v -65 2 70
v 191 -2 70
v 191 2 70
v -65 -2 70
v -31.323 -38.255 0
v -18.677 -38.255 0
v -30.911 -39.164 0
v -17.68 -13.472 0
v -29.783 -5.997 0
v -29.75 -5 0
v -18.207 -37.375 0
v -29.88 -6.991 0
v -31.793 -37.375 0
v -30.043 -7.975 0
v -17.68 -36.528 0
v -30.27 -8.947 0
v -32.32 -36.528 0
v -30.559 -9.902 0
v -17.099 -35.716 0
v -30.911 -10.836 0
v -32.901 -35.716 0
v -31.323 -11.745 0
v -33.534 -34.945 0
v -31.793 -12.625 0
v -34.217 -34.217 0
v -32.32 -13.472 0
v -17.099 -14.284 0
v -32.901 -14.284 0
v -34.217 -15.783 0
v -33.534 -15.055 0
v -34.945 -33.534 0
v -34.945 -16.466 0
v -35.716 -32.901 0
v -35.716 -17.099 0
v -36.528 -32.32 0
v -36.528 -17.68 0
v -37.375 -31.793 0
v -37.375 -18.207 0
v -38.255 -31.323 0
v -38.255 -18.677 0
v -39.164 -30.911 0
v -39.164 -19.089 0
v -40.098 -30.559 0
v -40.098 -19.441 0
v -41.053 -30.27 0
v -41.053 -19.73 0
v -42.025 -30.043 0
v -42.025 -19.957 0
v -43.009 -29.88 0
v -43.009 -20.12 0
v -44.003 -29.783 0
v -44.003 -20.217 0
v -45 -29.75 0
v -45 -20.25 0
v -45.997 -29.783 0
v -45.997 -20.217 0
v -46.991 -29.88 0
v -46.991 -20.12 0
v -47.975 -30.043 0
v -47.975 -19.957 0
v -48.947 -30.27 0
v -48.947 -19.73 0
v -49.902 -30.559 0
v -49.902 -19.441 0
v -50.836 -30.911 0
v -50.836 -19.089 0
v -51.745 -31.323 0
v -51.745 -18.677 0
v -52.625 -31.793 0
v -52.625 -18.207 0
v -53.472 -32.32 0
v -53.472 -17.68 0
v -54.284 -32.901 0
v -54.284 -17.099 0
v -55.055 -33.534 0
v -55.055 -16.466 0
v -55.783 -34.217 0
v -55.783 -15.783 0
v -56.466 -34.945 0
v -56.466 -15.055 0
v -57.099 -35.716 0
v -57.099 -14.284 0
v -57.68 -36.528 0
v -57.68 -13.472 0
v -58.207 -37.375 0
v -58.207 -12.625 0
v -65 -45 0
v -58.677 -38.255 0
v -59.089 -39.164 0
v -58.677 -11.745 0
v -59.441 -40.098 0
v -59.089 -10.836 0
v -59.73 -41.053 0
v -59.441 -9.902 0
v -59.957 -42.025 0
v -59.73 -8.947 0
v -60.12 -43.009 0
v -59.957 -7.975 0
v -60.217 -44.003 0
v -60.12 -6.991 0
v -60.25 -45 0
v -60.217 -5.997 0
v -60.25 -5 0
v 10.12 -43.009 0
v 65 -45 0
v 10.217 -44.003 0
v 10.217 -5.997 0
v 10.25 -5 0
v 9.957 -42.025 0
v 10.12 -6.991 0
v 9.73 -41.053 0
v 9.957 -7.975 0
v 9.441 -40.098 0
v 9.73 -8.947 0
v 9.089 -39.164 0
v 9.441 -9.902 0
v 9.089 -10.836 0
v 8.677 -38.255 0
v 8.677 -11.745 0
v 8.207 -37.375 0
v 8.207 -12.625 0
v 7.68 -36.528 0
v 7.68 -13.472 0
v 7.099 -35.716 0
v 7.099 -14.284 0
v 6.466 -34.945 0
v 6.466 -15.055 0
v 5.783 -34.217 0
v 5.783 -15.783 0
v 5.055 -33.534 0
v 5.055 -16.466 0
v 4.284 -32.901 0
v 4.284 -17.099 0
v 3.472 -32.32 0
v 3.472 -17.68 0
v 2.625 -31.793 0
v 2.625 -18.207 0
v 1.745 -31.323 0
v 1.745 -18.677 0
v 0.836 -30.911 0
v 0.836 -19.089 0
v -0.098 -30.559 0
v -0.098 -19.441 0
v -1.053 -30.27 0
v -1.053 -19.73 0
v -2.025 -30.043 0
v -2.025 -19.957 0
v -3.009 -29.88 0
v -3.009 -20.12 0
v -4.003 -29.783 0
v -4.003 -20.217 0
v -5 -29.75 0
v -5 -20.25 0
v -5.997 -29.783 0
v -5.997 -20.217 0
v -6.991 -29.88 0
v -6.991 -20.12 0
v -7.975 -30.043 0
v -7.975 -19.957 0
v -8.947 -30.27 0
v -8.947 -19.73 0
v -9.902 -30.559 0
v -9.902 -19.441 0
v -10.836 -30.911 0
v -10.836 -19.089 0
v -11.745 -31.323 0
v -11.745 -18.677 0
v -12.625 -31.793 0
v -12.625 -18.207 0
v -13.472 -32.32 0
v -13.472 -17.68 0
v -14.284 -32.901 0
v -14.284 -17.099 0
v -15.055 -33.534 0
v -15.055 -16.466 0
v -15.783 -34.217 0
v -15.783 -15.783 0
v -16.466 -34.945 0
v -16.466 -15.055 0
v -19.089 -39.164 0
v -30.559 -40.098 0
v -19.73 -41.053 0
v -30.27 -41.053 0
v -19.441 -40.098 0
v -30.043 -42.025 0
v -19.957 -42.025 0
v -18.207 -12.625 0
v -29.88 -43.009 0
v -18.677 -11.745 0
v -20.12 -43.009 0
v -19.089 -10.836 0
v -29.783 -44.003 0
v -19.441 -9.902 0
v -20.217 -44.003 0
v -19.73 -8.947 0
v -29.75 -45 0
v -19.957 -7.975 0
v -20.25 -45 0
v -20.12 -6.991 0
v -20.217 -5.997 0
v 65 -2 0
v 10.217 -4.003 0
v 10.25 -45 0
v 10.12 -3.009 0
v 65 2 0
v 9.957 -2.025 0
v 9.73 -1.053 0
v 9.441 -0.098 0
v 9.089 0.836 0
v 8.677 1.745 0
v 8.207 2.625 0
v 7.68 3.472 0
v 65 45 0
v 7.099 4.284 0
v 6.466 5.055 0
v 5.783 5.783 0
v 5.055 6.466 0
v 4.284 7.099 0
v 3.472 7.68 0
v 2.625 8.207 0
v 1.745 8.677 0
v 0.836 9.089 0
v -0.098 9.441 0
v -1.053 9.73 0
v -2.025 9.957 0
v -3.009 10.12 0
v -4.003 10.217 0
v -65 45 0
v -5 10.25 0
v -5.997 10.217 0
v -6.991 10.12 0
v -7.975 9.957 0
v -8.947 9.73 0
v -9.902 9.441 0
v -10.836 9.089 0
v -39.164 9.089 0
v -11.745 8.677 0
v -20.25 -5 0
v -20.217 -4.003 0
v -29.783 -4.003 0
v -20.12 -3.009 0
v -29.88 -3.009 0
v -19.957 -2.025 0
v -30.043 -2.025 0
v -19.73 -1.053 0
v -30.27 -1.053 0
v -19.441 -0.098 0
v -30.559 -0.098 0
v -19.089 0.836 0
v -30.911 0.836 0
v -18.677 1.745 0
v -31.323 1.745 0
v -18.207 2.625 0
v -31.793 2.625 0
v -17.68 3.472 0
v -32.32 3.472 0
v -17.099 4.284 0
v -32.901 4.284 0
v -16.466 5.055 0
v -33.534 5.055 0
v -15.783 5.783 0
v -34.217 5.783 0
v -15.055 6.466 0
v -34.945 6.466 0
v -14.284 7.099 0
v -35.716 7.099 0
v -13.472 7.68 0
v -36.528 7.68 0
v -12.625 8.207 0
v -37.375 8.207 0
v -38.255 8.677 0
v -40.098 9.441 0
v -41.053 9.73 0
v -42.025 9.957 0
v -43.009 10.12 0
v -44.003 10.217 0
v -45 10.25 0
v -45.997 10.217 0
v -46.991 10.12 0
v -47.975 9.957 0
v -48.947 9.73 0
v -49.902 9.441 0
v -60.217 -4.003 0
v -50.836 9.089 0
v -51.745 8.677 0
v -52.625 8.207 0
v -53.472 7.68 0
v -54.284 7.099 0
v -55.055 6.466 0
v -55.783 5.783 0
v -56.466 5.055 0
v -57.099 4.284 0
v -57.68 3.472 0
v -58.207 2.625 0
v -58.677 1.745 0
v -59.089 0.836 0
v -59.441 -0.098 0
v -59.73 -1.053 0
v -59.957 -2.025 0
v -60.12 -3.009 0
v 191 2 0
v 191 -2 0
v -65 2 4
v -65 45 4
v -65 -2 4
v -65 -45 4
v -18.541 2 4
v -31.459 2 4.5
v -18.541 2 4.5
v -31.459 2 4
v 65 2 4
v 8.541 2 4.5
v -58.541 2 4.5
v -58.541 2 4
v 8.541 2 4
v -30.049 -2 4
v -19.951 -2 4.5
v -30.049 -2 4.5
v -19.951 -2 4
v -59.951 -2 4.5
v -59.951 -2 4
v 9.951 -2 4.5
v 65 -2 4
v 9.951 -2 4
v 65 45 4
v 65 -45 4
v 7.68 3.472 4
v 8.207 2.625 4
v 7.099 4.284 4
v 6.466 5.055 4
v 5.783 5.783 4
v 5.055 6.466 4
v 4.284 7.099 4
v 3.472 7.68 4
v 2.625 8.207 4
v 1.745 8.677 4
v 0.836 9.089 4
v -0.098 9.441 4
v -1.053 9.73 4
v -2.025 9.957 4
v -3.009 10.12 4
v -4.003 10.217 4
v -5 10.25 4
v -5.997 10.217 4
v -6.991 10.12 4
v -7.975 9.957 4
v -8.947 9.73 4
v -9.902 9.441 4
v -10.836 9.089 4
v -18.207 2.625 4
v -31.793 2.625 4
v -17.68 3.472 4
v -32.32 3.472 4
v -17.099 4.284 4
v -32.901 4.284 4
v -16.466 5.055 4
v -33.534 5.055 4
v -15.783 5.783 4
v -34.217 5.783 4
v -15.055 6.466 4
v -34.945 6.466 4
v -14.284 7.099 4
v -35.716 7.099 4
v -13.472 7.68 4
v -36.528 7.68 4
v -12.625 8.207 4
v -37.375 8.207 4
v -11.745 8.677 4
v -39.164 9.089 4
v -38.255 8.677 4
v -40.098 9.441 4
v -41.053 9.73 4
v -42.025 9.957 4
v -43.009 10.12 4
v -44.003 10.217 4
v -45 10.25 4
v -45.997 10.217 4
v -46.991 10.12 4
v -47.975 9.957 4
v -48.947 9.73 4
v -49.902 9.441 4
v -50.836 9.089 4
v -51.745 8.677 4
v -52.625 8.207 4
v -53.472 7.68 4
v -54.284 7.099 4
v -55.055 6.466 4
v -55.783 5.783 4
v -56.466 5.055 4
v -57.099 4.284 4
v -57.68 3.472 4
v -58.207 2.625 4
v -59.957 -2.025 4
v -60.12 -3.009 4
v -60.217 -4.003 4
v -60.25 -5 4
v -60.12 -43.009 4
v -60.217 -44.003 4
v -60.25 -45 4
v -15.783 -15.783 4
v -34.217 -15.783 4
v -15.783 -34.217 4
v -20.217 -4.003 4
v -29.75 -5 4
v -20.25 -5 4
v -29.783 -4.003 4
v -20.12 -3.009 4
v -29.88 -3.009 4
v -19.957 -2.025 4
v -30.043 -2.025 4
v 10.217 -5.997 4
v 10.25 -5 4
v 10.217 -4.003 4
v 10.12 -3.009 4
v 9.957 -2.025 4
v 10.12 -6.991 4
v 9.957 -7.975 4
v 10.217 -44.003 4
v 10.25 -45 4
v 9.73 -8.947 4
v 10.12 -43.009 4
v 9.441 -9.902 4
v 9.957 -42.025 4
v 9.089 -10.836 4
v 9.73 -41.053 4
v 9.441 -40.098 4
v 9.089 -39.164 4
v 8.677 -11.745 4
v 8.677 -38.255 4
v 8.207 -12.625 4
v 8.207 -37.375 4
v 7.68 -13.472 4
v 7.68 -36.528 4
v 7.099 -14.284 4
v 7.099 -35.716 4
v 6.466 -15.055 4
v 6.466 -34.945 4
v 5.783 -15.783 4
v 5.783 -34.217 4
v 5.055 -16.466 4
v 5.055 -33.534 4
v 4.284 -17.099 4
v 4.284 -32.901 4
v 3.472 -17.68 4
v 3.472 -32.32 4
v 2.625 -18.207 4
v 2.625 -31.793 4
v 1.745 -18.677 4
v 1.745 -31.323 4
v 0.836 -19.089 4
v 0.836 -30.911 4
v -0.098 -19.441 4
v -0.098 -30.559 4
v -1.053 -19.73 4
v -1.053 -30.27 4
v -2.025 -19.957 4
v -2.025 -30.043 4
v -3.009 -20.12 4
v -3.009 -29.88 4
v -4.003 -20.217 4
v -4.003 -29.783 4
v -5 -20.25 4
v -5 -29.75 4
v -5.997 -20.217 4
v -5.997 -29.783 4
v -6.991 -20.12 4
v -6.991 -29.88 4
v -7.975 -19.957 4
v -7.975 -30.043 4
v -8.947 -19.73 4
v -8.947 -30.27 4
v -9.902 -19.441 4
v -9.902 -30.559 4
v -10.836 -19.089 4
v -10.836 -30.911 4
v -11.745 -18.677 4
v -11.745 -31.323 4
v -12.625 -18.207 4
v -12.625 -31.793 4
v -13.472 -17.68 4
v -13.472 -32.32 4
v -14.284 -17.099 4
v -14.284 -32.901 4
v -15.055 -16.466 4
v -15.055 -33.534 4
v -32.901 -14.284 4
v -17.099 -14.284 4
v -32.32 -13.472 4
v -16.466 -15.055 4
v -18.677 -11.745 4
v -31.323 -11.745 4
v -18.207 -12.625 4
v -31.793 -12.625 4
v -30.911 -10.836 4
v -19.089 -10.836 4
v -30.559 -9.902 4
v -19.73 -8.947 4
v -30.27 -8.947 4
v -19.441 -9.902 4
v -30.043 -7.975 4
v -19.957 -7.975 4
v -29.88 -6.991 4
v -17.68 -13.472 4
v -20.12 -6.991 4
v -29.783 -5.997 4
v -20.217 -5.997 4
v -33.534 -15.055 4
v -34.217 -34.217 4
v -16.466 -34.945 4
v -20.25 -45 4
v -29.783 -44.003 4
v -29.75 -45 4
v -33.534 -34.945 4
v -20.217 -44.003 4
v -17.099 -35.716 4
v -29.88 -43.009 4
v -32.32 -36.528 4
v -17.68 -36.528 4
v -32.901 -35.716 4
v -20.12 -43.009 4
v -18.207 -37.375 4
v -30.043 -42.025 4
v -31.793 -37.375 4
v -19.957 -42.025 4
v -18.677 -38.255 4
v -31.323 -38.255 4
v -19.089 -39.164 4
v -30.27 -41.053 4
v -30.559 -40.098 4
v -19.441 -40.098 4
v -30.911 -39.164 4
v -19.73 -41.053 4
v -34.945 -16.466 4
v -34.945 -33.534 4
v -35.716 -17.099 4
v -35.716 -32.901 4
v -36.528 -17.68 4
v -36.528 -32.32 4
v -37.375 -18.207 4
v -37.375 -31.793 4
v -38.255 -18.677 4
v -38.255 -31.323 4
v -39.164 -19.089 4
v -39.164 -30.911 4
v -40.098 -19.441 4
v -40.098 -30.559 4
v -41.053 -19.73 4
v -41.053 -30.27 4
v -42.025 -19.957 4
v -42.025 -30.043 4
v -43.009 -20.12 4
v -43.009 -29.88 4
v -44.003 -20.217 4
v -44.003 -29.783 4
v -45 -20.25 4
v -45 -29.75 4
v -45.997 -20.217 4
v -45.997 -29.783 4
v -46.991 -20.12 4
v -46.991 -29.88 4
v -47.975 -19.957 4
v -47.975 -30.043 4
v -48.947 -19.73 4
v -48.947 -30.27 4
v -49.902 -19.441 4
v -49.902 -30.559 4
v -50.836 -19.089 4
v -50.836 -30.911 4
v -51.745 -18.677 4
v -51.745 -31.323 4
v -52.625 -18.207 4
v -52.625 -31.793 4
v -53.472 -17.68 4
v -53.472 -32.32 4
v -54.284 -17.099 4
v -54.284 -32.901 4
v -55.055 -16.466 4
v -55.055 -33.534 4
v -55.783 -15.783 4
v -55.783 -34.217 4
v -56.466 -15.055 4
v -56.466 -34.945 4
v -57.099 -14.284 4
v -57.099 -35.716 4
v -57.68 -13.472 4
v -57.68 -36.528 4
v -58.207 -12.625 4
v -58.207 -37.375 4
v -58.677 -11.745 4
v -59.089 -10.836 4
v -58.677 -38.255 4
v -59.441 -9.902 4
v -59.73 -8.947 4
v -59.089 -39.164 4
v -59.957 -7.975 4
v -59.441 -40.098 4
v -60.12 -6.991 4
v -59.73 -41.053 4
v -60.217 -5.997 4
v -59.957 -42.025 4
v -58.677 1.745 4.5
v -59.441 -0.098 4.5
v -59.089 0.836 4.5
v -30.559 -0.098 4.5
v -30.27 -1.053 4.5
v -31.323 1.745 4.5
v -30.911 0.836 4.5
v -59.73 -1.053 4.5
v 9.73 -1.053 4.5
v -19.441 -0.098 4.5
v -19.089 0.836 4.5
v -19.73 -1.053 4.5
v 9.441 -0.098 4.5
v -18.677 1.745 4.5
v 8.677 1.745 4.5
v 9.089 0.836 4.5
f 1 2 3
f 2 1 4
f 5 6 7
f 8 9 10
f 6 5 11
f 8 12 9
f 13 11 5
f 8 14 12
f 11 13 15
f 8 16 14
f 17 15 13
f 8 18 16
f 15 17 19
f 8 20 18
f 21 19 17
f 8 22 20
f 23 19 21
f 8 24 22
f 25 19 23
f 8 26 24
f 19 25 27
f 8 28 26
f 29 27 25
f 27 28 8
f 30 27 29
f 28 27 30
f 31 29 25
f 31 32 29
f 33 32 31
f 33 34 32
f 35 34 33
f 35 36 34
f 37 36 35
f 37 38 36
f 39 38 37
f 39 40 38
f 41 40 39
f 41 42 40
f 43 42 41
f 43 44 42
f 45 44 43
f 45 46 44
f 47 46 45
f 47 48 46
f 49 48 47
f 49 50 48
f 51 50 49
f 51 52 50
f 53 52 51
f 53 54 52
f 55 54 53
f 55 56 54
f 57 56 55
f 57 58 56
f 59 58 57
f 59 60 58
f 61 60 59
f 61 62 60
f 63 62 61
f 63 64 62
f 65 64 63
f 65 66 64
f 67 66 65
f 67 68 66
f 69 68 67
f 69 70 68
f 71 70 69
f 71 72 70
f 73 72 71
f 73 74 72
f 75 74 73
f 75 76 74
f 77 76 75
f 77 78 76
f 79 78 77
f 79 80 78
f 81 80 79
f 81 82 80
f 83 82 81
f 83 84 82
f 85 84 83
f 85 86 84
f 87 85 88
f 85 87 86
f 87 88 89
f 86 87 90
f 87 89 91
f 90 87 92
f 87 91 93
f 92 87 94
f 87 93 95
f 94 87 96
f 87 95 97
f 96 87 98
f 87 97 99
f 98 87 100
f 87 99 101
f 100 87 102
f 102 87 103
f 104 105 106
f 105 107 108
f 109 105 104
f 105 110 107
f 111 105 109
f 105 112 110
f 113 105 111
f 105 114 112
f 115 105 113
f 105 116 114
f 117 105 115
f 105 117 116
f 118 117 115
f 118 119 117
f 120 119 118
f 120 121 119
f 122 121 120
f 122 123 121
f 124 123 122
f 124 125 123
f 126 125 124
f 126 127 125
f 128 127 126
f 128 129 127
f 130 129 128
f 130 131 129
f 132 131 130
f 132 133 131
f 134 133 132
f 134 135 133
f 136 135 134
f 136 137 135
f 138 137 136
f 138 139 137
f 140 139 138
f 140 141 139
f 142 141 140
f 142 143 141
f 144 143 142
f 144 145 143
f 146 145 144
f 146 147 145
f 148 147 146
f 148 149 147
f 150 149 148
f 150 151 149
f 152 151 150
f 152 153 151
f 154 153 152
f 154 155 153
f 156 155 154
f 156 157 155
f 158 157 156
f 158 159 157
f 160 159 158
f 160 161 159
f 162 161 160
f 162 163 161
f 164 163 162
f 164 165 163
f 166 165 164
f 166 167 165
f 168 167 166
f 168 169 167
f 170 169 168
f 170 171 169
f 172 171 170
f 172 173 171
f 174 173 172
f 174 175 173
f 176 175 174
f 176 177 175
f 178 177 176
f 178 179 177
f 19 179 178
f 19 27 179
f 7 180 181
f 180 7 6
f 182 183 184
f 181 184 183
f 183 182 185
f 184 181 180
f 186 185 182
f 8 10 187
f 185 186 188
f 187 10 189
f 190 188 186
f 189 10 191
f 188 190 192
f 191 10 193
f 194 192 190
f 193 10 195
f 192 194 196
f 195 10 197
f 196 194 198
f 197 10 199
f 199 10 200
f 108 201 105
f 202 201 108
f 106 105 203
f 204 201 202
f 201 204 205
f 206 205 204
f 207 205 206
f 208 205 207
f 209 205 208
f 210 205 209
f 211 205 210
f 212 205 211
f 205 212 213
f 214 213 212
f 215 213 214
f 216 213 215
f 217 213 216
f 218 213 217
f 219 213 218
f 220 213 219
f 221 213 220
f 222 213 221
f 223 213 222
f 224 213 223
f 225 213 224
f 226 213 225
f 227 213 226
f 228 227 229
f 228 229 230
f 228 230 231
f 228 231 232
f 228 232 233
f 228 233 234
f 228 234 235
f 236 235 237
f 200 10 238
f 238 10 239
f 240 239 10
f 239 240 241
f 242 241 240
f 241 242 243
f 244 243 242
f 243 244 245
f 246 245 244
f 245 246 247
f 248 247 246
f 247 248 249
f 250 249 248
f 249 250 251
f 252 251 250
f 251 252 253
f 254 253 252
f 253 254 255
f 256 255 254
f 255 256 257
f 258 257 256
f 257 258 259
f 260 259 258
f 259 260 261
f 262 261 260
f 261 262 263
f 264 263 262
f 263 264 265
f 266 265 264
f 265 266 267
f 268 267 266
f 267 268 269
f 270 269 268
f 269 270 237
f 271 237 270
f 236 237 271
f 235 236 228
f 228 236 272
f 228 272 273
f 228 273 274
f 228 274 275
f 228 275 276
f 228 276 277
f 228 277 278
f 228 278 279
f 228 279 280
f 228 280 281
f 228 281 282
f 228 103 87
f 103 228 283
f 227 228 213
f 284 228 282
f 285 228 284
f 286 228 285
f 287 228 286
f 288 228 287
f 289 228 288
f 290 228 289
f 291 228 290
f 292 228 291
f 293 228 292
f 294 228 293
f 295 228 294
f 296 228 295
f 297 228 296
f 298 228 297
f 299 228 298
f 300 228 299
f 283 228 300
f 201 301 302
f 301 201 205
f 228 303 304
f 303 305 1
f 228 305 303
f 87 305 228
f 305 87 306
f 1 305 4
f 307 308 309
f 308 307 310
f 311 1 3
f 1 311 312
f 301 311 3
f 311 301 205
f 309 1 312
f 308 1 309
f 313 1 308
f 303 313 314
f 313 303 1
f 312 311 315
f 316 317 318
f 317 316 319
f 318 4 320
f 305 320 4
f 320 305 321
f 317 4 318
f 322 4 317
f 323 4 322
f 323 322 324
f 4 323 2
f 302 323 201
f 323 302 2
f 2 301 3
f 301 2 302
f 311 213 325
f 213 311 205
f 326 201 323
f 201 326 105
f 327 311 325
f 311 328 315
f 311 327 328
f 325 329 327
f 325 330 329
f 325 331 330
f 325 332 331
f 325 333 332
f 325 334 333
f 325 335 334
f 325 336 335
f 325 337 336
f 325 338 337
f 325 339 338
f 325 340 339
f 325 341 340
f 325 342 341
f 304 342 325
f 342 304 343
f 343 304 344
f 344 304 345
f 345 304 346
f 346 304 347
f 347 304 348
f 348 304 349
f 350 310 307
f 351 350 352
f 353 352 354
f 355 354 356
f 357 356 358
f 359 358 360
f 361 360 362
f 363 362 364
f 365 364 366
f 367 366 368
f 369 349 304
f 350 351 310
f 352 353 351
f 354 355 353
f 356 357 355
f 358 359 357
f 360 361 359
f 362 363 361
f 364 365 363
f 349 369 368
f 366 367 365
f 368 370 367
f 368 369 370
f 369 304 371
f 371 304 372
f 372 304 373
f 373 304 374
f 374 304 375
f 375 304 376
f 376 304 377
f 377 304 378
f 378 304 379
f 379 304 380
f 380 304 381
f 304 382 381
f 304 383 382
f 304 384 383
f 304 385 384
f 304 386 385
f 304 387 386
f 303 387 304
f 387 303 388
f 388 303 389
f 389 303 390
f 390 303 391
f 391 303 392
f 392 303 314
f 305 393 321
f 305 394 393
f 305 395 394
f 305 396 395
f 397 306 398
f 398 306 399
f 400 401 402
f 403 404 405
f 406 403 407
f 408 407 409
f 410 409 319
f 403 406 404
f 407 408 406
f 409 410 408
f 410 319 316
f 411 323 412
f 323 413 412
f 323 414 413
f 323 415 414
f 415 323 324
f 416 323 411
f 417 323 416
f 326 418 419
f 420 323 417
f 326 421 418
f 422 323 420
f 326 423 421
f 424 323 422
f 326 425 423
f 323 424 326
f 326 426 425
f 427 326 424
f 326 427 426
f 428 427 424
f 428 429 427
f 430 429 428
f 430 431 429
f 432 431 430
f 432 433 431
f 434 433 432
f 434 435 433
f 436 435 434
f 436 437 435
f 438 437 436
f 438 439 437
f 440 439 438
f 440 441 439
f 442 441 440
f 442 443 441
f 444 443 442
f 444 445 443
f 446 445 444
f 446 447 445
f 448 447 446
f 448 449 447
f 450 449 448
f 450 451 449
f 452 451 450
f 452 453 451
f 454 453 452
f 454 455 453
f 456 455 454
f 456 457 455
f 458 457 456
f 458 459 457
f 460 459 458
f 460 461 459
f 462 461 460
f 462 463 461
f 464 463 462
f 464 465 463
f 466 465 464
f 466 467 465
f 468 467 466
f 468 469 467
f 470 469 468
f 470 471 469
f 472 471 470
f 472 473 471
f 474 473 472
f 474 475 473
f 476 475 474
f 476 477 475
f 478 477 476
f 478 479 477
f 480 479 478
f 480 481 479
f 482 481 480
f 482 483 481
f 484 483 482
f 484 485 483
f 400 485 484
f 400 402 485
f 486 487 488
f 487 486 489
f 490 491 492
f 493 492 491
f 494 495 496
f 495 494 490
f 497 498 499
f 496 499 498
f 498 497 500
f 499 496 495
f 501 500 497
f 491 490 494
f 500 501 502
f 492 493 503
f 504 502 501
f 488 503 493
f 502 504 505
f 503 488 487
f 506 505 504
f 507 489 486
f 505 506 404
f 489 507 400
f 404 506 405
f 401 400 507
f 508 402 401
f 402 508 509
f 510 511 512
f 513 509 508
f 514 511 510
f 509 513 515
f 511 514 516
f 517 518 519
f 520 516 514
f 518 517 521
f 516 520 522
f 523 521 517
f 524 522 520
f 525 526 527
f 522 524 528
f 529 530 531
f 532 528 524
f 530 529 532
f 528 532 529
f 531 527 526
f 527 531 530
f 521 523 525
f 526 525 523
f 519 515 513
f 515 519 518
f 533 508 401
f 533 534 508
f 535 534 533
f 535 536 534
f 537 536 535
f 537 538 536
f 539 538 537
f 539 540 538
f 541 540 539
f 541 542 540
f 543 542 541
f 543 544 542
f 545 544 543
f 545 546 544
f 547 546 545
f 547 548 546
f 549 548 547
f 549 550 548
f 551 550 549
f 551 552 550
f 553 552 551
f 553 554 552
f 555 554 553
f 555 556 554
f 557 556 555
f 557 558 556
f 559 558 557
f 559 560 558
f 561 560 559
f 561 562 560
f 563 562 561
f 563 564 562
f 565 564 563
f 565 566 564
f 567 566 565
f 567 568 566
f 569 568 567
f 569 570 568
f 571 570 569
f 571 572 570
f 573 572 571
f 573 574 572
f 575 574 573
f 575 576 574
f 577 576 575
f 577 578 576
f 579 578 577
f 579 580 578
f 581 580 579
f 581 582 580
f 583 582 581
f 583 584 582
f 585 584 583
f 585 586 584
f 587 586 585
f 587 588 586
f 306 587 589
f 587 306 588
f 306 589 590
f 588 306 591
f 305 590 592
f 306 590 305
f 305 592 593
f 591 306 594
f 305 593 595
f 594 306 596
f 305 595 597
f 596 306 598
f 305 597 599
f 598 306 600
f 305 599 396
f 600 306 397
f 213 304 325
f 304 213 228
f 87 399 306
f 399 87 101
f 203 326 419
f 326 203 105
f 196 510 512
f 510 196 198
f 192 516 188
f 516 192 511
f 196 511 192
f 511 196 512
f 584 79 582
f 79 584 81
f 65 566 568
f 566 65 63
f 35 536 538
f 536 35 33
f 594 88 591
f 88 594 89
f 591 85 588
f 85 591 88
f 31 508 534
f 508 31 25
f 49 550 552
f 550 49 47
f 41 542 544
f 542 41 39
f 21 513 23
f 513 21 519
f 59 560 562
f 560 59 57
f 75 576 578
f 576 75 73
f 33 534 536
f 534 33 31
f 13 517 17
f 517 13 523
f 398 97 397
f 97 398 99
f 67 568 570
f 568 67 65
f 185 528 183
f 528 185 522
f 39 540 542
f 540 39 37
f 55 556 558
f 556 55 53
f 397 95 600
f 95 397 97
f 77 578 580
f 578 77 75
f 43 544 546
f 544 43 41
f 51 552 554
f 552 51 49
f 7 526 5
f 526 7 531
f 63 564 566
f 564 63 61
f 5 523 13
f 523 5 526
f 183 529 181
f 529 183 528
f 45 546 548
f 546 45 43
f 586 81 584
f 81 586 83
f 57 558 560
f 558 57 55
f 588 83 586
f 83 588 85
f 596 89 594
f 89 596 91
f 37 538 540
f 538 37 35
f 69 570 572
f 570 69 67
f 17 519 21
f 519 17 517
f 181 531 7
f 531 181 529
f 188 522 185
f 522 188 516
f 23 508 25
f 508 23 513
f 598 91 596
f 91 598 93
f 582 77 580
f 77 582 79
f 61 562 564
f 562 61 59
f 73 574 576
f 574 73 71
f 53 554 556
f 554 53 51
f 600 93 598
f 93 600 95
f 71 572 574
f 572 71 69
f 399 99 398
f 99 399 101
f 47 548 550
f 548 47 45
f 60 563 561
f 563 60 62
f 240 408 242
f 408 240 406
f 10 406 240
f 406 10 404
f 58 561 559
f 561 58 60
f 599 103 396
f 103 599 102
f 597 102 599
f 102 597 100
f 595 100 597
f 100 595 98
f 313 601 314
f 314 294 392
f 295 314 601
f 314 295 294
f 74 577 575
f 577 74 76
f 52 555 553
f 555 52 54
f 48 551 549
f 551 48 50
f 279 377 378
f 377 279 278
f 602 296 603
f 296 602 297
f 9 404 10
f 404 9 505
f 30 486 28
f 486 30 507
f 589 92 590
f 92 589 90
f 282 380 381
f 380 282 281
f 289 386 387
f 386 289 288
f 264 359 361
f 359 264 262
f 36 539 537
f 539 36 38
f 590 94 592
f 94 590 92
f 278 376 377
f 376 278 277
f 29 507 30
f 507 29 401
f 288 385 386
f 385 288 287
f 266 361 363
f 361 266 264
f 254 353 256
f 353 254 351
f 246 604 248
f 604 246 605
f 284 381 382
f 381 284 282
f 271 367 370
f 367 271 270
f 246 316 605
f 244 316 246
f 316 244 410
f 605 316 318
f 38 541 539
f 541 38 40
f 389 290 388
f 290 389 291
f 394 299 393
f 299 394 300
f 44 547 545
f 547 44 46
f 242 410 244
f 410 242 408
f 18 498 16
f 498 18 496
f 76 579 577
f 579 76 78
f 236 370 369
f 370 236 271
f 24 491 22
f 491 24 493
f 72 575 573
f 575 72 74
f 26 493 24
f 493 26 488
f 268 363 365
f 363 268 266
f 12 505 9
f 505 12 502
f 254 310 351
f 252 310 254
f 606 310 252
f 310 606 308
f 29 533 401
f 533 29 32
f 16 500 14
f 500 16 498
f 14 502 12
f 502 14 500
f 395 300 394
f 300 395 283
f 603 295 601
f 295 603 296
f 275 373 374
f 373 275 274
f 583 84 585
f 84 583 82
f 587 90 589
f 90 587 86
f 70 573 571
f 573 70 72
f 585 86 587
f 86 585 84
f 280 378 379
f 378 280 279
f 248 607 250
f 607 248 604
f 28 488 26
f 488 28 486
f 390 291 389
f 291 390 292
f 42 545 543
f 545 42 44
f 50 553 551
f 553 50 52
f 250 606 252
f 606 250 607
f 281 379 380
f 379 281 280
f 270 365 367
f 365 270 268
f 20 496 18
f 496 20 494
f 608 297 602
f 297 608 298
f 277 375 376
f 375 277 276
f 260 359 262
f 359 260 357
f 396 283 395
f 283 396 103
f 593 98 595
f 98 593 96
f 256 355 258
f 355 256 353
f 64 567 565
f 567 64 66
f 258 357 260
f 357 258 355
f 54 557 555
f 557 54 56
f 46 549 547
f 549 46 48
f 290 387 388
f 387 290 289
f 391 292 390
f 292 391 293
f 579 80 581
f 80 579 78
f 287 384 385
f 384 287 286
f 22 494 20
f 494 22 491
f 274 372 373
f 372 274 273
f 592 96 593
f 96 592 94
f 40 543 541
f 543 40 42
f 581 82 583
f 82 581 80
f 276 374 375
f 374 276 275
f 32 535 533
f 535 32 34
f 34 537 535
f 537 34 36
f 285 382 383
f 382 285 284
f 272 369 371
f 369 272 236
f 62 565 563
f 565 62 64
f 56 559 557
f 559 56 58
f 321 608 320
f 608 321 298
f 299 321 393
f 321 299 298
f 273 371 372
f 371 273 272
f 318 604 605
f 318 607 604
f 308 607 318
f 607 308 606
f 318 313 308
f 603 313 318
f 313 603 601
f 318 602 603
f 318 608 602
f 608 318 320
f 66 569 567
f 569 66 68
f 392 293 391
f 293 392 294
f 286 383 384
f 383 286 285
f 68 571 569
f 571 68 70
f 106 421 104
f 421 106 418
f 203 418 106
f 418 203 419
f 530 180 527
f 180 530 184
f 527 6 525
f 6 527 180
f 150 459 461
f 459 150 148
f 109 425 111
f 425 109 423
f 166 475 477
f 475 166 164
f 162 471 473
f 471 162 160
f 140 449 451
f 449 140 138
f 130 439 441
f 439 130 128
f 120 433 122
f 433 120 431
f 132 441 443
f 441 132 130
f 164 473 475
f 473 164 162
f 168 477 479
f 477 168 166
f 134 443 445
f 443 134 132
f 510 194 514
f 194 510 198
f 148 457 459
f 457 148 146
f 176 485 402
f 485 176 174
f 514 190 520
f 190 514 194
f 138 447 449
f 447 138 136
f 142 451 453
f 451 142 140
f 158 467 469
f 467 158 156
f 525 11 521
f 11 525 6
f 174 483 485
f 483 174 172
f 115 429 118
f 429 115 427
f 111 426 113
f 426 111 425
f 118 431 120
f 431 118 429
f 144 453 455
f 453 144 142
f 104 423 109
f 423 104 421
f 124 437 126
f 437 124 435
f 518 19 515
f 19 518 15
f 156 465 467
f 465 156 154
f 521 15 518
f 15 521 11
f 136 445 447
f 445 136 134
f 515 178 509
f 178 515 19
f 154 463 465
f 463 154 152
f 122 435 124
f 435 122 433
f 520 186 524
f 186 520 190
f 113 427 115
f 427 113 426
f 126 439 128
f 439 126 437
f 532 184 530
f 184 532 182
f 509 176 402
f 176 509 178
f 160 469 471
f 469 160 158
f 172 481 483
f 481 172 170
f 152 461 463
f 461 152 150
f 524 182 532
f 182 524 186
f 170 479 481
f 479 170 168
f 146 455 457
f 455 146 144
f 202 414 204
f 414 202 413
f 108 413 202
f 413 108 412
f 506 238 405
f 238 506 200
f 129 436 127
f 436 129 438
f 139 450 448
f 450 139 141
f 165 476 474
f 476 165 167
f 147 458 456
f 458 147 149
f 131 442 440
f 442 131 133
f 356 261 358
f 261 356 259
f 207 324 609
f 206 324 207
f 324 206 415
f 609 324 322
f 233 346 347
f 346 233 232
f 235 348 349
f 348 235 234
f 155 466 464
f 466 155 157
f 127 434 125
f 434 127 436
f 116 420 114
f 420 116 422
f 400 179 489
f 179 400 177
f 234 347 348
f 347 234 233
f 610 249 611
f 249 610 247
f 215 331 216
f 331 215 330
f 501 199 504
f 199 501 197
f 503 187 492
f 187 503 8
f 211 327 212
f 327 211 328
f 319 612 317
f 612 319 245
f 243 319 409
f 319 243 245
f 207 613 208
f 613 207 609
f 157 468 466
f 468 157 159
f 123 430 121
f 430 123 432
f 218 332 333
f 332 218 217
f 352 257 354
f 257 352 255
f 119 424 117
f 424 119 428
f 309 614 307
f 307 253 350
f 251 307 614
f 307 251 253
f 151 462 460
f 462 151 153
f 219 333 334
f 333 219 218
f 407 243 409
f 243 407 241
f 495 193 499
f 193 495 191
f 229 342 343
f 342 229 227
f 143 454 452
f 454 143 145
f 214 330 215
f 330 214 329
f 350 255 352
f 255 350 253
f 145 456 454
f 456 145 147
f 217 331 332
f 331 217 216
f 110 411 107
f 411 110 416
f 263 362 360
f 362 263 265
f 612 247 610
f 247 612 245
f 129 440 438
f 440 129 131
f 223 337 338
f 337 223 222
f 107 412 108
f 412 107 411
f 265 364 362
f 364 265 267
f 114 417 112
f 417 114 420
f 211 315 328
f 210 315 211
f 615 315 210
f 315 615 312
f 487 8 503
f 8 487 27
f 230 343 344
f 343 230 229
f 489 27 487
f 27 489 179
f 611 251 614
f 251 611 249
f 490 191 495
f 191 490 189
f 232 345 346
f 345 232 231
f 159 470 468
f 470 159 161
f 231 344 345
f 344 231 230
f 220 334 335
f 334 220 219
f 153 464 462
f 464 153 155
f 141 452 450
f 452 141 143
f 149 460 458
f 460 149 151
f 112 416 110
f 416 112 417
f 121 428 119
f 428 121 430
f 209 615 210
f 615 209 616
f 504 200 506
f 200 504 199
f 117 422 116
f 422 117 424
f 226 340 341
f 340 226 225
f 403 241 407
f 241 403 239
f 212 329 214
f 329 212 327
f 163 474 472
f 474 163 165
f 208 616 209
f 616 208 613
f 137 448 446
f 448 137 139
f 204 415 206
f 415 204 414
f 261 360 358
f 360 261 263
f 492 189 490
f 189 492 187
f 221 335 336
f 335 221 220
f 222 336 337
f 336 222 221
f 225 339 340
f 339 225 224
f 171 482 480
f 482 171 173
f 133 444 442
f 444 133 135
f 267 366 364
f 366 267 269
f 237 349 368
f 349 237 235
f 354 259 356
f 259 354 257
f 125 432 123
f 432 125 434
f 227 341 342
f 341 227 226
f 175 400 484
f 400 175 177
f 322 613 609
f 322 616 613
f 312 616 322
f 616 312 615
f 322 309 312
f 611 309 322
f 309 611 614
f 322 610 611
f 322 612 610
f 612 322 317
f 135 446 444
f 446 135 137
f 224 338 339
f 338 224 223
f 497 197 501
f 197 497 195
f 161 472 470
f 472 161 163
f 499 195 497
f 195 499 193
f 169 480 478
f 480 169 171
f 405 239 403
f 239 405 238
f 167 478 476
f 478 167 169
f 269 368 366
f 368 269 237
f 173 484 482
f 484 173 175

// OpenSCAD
// Rack for six 50 mL conical (Falcon-type) tubes
// Print orientation: flat plate on bed, walls up, holes facing up
// Flip over after printing so the rack stands on the walls

// ---------- Parameters ----------
plate_x      = 130;   // plate length along X
plate_y      = 90;    // plate width along Y
plate_t      = 4;     // plate thickness (z = 0 to 4)

hole_d       = 30.5;  // through-hole diameter
hole_nx      = 3;     // holes along X (row length)
hole_ny      = 2;     // holes along Y (row count)
hole_pitch   = 40;    // centre-to-centre spacing in X and Y

wall_len     = 130;   // wall length along X
wall_t       = 4;     // wall thickness along Y
wall_top_z   = 70;    // wall top height (absolute Z)

eps          = 0.5;   // cutter overshoot past faces
$fn          = 96;    // curve resolution

// ---------- Model ----------
difference() {
    union() {
        // Base plate
        translate([-plate_x/2, -plate_y/2, 0])
            cube([plate_x, plate_y, plate_t]);

        // Two solid walls along the long edges
        for (s = [-1, 1])
            translate([s > 0 ? plate_x/2 - wall_t : -plate_x/2,
                       -wall_t/2, 0])
                cube([wall_len, wall_t, wall_top_z]);
    }

    // Through-holes in a 2 x 3 grid, centred on the plate
    for (i = [0 : hole_nx - 1])
        for (j = [0 : hole_ny - 1])
            translate([(i - (hole_nx - 1)/2) * hole_pitch - plate_x/2 + hole_pitch/2,
                       (j - (hole_ny - 1)/2) * hole_pitch - plate_y/2 + hole_pitch/2,
                       -eps])
                cylinder(d = hole_d, h = plate_t + 2 * eps);
}
